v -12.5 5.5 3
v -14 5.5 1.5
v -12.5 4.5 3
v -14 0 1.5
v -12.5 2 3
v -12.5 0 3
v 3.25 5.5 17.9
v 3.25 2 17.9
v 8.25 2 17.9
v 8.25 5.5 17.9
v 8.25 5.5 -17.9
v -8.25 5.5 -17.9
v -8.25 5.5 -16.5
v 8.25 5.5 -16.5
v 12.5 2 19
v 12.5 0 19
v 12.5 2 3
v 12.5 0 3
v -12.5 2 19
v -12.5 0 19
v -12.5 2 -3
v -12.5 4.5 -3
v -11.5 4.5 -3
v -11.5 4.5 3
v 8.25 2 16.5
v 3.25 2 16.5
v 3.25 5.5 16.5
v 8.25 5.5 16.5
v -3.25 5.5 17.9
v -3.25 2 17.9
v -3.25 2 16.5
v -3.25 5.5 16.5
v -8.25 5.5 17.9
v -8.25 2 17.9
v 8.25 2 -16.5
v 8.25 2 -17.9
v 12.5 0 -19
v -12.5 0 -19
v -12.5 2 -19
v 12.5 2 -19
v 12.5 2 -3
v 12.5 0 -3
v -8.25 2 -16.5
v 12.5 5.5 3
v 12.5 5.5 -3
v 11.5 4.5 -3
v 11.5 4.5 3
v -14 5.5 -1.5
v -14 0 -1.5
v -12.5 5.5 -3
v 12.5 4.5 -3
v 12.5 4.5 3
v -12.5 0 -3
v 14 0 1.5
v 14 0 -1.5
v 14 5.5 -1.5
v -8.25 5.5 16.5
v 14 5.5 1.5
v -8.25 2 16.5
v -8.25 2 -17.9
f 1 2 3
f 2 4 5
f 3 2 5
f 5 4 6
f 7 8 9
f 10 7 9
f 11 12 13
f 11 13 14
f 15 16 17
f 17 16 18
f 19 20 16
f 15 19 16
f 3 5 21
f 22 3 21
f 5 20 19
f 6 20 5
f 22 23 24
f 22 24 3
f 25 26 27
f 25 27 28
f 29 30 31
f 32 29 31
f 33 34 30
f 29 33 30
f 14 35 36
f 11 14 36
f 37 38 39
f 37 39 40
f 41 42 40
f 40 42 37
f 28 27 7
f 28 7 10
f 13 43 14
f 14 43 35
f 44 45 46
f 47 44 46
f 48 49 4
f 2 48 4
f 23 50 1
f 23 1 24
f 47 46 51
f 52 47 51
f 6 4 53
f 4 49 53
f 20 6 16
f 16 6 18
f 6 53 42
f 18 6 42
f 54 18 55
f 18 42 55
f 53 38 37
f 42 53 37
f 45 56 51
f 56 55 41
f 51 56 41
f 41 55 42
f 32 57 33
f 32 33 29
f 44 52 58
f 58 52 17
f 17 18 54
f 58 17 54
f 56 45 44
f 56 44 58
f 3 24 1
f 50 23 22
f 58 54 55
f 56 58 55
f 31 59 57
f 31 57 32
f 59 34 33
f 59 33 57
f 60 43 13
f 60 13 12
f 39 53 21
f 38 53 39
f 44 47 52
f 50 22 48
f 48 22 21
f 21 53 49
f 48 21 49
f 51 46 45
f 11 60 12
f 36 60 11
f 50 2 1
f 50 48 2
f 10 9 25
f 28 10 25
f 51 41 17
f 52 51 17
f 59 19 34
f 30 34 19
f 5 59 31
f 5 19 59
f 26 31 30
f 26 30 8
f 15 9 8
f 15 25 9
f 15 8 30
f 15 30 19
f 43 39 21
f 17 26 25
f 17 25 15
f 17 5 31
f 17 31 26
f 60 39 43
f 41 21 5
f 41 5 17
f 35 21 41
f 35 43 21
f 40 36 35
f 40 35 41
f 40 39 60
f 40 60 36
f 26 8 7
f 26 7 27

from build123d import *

# Parameters (mm, degrees)
SKETCH1_W                = 25
SKETCH1_H                = 38
SKETCH1_W_2              = 16.5
SKETCH1_H_2              = 1.4
BOSS_EXTRUDE1_DEPTH      = 2
SKETCH1_3_W              = 16.5
SKETCH1_3_H              = 1.4
BOSS_EXTRUDE2_DEPTH      = 5.5
BOSS_EXTRUDE3_DEPTH      = 3
BOSS_EXTRUDE3_DEPTH_BACK = 3
SKETCH3_W                = 6.5
SKETCH3_H                = 1.4
CUT_EXTRUDE1_DEPTH       = 3.5


with BuildPart() as part:
    # Sketch1 → Boss-Extrude1 (new body)
    with BuildSketch(Plane(origin=(0, 0, 0), x_dir=(1, 0, 0), z_dir=(0, 1, 0))):
        Rectangle(SKETCH1_W, SKETCH1_H)
        with Locations((0, -17.2)):
            Rectangle(SKETCH1_W_2, SKETCH1_H_2, mode=Mode.SUBTRACT)
        with Locations((0, 17.2)):
            Rectangle(SKETCH1_W_2, SKETCH1_H_2, mode=Mode.SUBTRACT)
    extrude(amount=BOSS_EXTRUDE1_DEPTH)

    # Sketch1<3> → Boss-Extrude2 (add)
    with BuildSketch(Plane(origin=(0, 0, 0), x_dir=(1, 0, 0), z_dir=(0, 1, 0))):
        Polygon((-14, -1.5), (-12.5, -3), (-12.5, 3), (-14, 1.5), align=None)
        Polygon((12.5, 3), (12.5, -3), (14, -1.5), (14, 1.5), align=None)
        with Locations((0, 17.2)):
            Rectangle(SKETCH1_3_W, SKETCH1_3_H)
        with Locations((0, -17.2)):
            Rectangle(SKETCH1_3_W, SKETCH1_3_H)
    extrude(amount=BOSS_EXTRUDE2_DEPTH)

    # Sketch2 → Boss-Extrude3 (add, two sides: drawn at the far end of the back side and taken through both)
    with BuildSketch(Plane.XY.offset(-BOSS_EXTRUDE3_DEPTH_BACK)):
        Polygon((12.5, 5.5), (11.5, 4.5), (12.5, 4.5), align=None)
        Polygon((-11.5, 4.5), (-12.5, 4.5), (-12.5, 5.5), align=None)
    extrude(amount=BOSS_EXTRUDE3_DEPTH + BOSS_EXTRUDE3_DEPTH_BACK)

    # Sketch3 → Cut-Extrude1 (cut)
    with BuildSketch(Plane(origin=(0, 2, 0), x_dir=(1, 0, 0), z_dir=(0, 1, 0))):
        with Locations((0, -17.2)):
            Rectangle(SKETCH3_W, SKETCH3_H)
    extrude(amount=CUT_EXTRUDE1_DEPTH, mode=Mode.SUBTRACT)


solid = part.part
